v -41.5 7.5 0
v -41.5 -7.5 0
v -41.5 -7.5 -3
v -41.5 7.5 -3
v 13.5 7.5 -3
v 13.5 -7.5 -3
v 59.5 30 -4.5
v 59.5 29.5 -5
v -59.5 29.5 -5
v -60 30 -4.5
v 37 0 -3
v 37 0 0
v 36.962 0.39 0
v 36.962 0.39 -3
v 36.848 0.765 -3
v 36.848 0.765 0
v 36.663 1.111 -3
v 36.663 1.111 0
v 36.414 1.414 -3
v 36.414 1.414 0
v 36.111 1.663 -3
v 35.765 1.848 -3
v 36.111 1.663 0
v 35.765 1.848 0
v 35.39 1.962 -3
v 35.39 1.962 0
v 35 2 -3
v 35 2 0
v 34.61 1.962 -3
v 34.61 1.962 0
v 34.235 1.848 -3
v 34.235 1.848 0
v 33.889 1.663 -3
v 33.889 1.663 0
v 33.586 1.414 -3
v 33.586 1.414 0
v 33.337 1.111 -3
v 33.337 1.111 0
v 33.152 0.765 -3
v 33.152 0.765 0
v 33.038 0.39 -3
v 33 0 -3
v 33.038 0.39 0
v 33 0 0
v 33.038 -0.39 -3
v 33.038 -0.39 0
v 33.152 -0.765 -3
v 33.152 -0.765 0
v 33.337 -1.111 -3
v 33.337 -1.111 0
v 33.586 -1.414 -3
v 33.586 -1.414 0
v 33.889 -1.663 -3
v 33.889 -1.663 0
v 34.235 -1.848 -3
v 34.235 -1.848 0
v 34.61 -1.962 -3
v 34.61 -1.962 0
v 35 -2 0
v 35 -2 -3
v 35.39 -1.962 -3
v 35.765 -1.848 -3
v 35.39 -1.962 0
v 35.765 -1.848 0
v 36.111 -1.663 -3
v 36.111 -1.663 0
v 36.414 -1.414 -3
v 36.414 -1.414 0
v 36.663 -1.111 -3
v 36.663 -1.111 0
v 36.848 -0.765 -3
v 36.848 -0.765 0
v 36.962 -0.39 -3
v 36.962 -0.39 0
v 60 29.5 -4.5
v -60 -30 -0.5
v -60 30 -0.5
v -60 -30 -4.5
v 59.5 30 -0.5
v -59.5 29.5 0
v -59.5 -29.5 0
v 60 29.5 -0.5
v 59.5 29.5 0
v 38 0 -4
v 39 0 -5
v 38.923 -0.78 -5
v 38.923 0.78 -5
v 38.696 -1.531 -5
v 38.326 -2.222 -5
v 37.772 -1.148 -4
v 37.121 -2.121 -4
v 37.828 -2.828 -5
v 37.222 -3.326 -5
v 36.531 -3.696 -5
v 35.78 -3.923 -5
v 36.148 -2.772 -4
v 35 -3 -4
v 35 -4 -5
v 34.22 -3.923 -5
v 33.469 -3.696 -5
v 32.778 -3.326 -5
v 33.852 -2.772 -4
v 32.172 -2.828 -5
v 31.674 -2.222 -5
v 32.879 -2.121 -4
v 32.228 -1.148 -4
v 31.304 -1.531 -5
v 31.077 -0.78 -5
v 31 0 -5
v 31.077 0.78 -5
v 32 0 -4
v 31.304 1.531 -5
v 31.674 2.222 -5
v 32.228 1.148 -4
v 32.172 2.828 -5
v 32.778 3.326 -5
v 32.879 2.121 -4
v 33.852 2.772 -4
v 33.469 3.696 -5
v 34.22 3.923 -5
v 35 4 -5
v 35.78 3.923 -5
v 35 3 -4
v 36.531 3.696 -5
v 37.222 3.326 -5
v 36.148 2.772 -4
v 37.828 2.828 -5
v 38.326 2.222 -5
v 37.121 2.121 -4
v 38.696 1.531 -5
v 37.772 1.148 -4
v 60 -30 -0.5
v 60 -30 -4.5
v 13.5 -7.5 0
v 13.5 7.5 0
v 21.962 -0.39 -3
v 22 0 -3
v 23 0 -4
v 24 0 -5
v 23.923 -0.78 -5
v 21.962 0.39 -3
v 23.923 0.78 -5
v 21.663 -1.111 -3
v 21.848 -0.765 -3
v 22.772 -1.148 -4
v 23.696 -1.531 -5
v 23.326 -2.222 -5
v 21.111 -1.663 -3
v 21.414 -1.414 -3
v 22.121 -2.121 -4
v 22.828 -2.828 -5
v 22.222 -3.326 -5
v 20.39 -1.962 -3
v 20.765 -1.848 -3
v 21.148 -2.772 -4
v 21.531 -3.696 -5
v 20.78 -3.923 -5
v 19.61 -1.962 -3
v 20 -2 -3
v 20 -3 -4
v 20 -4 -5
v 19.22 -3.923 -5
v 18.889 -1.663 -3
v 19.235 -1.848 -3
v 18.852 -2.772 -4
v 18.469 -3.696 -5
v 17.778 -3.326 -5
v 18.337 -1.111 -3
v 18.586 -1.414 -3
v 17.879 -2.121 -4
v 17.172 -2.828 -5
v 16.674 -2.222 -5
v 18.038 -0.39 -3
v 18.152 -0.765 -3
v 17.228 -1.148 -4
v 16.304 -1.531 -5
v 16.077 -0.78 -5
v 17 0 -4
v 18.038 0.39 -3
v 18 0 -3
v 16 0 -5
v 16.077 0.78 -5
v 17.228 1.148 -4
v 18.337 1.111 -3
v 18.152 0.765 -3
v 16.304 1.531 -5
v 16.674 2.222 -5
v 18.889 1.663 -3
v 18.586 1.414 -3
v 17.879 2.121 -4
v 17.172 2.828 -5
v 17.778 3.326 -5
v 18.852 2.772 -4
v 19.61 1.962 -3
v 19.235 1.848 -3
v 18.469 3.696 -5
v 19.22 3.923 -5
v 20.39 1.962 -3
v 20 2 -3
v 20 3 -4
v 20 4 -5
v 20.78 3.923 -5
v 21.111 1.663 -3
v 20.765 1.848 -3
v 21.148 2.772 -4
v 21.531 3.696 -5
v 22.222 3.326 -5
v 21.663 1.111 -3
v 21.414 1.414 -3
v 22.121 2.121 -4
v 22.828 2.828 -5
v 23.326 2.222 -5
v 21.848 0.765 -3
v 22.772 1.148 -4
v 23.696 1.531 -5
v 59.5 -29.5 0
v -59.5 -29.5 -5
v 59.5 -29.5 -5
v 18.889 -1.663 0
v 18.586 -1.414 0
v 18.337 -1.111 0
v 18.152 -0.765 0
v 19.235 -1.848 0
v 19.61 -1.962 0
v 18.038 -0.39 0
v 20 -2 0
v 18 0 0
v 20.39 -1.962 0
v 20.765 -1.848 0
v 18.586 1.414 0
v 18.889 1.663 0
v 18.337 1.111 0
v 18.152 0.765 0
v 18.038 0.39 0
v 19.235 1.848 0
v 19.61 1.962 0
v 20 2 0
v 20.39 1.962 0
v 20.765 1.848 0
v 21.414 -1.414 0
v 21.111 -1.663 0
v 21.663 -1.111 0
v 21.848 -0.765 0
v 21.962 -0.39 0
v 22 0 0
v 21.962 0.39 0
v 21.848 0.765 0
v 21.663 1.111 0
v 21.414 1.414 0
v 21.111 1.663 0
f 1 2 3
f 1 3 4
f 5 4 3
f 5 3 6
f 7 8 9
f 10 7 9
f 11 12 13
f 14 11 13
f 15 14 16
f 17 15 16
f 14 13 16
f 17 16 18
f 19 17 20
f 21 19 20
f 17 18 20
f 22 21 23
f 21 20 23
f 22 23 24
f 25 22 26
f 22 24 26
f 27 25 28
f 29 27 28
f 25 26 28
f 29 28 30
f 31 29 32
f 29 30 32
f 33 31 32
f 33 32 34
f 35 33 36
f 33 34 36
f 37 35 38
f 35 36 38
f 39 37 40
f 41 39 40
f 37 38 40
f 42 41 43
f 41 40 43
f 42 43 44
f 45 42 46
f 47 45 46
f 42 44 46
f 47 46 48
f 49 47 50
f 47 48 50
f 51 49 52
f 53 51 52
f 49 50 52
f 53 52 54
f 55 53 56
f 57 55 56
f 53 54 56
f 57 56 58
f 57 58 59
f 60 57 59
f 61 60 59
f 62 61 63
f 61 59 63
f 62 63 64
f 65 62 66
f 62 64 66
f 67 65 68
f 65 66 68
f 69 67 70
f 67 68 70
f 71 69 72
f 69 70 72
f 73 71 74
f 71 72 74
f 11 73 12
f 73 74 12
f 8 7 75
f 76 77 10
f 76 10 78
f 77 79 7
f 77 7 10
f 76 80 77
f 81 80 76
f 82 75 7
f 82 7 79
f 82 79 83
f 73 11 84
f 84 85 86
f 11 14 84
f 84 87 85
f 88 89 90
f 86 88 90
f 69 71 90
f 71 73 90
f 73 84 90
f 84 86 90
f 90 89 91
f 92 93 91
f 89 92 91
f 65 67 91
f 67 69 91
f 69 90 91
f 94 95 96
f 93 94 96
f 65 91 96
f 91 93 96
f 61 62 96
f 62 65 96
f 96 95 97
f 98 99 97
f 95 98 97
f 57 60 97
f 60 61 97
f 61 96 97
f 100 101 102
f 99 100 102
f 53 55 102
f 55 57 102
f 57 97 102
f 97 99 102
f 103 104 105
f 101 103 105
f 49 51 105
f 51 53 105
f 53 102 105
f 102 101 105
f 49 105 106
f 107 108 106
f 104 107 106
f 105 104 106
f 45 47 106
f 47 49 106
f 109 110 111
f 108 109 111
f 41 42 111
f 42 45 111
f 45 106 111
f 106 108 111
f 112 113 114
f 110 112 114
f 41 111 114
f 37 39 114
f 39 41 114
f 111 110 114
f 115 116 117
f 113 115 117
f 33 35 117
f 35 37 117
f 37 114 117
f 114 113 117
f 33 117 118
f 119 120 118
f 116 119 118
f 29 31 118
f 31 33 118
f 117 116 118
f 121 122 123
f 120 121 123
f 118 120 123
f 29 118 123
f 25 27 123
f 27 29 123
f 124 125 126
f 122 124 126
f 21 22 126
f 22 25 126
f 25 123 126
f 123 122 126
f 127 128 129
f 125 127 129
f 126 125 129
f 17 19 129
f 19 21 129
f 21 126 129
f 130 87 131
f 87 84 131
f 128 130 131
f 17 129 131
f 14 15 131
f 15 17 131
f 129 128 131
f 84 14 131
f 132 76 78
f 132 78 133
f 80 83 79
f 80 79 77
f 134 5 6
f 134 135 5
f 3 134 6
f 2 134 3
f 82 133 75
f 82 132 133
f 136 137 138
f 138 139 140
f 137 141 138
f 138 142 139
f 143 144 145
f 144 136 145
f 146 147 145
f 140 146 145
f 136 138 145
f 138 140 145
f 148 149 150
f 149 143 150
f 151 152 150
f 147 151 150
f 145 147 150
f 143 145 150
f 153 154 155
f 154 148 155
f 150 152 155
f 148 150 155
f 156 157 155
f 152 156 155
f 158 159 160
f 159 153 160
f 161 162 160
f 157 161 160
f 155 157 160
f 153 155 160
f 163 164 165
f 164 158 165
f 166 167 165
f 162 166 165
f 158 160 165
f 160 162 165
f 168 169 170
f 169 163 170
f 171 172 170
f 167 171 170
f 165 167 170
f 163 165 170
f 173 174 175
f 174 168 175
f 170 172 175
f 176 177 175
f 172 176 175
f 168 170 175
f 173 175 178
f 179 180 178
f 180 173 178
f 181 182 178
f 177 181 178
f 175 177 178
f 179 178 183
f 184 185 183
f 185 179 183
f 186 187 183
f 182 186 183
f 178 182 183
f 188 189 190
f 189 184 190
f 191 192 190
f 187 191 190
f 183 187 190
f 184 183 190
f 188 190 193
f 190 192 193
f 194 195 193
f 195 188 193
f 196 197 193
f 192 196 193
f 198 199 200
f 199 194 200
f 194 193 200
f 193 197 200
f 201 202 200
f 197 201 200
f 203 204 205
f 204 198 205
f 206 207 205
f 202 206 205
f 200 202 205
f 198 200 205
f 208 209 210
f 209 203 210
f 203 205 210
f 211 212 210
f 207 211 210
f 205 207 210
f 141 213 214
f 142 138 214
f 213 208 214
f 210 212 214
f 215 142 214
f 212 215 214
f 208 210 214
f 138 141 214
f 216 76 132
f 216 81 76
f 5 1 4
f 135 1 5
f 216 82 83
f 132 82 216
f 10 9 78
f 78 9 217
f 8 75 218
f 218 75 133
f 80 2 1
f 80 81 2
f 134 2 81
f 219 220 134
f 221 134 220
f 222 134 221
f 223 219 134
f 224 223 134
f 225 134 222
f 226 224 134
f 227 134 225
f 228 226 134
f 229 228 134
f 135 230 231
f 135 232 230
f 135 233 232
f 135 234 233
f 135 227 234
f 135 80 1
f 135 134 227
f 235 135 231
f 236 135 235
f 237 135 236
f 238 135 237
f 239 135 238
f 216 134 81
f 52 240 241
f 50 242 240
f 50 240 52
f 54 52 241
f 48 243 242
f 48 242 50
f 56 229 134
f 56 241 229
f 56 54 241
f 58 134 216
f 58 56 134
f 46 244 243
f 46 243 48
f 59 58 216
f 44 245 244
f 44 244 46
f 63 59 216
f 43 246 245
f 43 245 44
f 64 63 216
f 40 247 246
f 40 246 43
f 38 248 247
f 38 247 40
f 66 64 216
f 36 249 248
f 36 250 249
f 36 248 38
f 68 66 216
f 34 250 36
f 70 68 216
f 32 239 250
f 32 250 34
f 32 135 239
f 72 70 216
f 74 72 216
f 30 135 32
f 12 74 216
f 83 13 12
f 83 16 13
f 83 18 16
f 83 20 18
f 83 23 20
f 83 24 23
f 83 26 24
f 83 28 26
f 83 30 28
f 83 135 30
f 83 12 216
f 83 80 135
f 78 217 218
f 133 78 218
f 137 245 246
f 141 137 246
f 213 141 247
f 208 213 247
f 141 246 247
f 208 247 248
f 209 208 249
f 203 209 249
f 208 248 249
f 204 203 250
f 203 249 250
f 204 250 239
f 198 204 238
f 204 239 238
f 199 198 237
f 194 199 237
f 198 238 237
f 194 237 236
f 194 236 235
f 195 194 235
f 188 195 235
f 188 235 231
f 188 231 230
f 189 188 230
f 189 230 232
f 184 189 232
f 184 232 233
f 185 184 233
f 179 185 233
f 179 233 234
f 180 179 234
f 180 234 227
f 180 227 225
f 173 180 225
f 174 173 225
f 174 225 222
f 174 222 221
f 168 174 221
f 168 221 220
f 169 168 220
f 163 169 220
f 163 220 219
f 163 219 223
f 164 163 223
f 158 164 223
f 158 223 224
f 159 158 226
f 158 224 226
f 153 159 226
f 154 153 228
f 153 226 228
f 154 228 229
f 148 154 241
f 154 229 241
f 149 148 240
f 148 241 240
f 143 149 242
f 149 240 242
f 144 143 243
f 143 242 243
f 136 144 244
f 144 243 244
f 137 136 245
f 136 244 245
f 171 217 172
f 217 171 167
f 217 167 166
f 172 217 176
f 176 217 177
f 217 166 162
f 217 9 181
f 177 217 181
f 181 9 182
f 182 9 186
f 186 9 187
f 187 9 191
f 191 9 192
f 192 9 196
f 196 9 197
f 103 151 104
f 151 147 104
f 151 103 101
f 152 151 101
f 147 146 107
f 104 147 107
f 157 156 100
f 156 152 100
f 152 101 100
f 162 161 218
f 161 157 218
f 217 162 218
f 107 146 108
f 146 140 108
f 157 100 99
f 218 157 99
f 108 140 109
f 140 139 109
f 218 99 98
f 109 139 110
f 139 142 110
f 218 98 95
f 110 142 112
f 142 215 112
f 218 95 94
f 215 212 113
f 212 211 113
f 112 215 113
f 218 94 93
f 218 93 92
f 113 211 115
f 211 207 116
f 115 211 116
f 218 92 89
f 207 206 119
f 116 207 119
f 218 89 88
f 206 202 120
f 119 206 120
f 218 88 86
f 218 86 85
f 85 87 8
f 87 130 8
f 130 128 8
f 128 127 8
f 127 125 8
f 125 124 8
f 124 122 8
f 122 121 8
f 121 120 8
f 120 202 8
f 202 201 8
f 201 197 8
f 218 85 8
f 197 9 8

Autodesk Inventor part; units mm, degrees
ref_plane "YZ Plane" through (0, 0, 0) normal (1, 0, 0) x (0, 1, 0)
ref_plane "XZ Plane" through (0, 0, 0) normal (0, 1, 0) x (-1, 0, 0)
ref_plane "XY Plane" through (0, 0, 0) normal (0, 0, 1) x (1, 0, 0)
sketch "Szkic1" plane through (0, 0, 0) normal (0, 0, 1) x (1, 0, 0)
  line L0 (-60, -30) -> (60, -30)
  line L1 (60, -30) -> (60, 30)
  line L2 (60, 30) -> (-60, 30)
  line L3 (-60, 30) -> (-60, -30)
  line L4 (-60, -30) -> (60, 30) construction
  line L5 (60, -30) -> (-60, 30) construction
  point P0 (0, 0)
  dimension "d0" = 120
  dimension "d1" = 60
extrude "Wyciągnięcie proste1" add sketch "Szkic1" against normal blind 5
sketch "Szkic2" plane through (0, 0, 0) normal (0, 0, 1) x (1, 0, 0)
  circle A0 centre (-35, 0) radius 2.5 projected
  circle A1 centre (-20, 0) radius 2.5 projected
  circle A2 centre (20, 0) radius 2 projected
  circle A3 centre (35, 0) radius 2 projected
  line L0 (-39.7, -6.05) -> (-39.7, 6.05) projected
  line L1 (39.7, -6.05) -> (-39.7, -6.05) projected
  line L2 (39.7, 6.05) -> (39.7, -6.05) projected
  line L3 (-39.7, 6.05) -> (39.7, 6.05) projected
  line L4 (-41.5, 7.5) -> (13.5, 7.5)
  line L5 (13.5, 7.5) -> (13.5, -7.5)
  line L6 (13.5, -7.5) -> (-41.5, -7.5)
  line L7 (-41.5, -7.5) -> (-41.5, 7.5)
  line L8 (-41.5, 7.5) -> (13.5, -7.5) construction
  line L9 (13.5, 7.5) -> (-41.5, -7.5) construction
  point P0 (0, 0)
  point P1 (-14, 0)
  dimension "d4" = 55
  dimension "d5" = 15
  dimension "d6" = 14
extrude "Wyciągnięcie proste2" cut sketch "Szkic2" against normal blind 3 contours A0 | A1 | L1 L5 L6 L7 L4 L3 L0 | L0 L3 L5 L1
sketch "Szkic3" plane through (0, 0, 0) normal (0, 0, 1) x (1, 0, 0)
  circle A0 centre (35, 0) radius 2 projected
  circle A1 centre (20, 0) radius 2 projected
  point P0 (0, 0)
extrude "Wyciągnięcie proste3" cut sketch "Szkic3" against normal through all
thread "Gwint1" size "M4x0.7" class "6H" standard "ANSI Metric M Profile" full length
thread "Gwint2" size "M4x0.7" class "6H" standard "ANSI Metric M Profile" full length
chamfer "Faza2" distance 0.5 angle 45 9 edges at (60, 30, -2.5) (0, 30, 0) (0, 30, -5) (60, 0, 0) (60, 0, -5) (0, -30, 0) (0, -30, -5) (-60, 0, 0) (-60, 0, -5)
chamfer "Faza3" distance 2 angle 45 2 edges at (18, 0, -5) (33, 0, -5)
properties part number "podstwa" material "MDF — płyta pilśniowa o średniej gęstości"
